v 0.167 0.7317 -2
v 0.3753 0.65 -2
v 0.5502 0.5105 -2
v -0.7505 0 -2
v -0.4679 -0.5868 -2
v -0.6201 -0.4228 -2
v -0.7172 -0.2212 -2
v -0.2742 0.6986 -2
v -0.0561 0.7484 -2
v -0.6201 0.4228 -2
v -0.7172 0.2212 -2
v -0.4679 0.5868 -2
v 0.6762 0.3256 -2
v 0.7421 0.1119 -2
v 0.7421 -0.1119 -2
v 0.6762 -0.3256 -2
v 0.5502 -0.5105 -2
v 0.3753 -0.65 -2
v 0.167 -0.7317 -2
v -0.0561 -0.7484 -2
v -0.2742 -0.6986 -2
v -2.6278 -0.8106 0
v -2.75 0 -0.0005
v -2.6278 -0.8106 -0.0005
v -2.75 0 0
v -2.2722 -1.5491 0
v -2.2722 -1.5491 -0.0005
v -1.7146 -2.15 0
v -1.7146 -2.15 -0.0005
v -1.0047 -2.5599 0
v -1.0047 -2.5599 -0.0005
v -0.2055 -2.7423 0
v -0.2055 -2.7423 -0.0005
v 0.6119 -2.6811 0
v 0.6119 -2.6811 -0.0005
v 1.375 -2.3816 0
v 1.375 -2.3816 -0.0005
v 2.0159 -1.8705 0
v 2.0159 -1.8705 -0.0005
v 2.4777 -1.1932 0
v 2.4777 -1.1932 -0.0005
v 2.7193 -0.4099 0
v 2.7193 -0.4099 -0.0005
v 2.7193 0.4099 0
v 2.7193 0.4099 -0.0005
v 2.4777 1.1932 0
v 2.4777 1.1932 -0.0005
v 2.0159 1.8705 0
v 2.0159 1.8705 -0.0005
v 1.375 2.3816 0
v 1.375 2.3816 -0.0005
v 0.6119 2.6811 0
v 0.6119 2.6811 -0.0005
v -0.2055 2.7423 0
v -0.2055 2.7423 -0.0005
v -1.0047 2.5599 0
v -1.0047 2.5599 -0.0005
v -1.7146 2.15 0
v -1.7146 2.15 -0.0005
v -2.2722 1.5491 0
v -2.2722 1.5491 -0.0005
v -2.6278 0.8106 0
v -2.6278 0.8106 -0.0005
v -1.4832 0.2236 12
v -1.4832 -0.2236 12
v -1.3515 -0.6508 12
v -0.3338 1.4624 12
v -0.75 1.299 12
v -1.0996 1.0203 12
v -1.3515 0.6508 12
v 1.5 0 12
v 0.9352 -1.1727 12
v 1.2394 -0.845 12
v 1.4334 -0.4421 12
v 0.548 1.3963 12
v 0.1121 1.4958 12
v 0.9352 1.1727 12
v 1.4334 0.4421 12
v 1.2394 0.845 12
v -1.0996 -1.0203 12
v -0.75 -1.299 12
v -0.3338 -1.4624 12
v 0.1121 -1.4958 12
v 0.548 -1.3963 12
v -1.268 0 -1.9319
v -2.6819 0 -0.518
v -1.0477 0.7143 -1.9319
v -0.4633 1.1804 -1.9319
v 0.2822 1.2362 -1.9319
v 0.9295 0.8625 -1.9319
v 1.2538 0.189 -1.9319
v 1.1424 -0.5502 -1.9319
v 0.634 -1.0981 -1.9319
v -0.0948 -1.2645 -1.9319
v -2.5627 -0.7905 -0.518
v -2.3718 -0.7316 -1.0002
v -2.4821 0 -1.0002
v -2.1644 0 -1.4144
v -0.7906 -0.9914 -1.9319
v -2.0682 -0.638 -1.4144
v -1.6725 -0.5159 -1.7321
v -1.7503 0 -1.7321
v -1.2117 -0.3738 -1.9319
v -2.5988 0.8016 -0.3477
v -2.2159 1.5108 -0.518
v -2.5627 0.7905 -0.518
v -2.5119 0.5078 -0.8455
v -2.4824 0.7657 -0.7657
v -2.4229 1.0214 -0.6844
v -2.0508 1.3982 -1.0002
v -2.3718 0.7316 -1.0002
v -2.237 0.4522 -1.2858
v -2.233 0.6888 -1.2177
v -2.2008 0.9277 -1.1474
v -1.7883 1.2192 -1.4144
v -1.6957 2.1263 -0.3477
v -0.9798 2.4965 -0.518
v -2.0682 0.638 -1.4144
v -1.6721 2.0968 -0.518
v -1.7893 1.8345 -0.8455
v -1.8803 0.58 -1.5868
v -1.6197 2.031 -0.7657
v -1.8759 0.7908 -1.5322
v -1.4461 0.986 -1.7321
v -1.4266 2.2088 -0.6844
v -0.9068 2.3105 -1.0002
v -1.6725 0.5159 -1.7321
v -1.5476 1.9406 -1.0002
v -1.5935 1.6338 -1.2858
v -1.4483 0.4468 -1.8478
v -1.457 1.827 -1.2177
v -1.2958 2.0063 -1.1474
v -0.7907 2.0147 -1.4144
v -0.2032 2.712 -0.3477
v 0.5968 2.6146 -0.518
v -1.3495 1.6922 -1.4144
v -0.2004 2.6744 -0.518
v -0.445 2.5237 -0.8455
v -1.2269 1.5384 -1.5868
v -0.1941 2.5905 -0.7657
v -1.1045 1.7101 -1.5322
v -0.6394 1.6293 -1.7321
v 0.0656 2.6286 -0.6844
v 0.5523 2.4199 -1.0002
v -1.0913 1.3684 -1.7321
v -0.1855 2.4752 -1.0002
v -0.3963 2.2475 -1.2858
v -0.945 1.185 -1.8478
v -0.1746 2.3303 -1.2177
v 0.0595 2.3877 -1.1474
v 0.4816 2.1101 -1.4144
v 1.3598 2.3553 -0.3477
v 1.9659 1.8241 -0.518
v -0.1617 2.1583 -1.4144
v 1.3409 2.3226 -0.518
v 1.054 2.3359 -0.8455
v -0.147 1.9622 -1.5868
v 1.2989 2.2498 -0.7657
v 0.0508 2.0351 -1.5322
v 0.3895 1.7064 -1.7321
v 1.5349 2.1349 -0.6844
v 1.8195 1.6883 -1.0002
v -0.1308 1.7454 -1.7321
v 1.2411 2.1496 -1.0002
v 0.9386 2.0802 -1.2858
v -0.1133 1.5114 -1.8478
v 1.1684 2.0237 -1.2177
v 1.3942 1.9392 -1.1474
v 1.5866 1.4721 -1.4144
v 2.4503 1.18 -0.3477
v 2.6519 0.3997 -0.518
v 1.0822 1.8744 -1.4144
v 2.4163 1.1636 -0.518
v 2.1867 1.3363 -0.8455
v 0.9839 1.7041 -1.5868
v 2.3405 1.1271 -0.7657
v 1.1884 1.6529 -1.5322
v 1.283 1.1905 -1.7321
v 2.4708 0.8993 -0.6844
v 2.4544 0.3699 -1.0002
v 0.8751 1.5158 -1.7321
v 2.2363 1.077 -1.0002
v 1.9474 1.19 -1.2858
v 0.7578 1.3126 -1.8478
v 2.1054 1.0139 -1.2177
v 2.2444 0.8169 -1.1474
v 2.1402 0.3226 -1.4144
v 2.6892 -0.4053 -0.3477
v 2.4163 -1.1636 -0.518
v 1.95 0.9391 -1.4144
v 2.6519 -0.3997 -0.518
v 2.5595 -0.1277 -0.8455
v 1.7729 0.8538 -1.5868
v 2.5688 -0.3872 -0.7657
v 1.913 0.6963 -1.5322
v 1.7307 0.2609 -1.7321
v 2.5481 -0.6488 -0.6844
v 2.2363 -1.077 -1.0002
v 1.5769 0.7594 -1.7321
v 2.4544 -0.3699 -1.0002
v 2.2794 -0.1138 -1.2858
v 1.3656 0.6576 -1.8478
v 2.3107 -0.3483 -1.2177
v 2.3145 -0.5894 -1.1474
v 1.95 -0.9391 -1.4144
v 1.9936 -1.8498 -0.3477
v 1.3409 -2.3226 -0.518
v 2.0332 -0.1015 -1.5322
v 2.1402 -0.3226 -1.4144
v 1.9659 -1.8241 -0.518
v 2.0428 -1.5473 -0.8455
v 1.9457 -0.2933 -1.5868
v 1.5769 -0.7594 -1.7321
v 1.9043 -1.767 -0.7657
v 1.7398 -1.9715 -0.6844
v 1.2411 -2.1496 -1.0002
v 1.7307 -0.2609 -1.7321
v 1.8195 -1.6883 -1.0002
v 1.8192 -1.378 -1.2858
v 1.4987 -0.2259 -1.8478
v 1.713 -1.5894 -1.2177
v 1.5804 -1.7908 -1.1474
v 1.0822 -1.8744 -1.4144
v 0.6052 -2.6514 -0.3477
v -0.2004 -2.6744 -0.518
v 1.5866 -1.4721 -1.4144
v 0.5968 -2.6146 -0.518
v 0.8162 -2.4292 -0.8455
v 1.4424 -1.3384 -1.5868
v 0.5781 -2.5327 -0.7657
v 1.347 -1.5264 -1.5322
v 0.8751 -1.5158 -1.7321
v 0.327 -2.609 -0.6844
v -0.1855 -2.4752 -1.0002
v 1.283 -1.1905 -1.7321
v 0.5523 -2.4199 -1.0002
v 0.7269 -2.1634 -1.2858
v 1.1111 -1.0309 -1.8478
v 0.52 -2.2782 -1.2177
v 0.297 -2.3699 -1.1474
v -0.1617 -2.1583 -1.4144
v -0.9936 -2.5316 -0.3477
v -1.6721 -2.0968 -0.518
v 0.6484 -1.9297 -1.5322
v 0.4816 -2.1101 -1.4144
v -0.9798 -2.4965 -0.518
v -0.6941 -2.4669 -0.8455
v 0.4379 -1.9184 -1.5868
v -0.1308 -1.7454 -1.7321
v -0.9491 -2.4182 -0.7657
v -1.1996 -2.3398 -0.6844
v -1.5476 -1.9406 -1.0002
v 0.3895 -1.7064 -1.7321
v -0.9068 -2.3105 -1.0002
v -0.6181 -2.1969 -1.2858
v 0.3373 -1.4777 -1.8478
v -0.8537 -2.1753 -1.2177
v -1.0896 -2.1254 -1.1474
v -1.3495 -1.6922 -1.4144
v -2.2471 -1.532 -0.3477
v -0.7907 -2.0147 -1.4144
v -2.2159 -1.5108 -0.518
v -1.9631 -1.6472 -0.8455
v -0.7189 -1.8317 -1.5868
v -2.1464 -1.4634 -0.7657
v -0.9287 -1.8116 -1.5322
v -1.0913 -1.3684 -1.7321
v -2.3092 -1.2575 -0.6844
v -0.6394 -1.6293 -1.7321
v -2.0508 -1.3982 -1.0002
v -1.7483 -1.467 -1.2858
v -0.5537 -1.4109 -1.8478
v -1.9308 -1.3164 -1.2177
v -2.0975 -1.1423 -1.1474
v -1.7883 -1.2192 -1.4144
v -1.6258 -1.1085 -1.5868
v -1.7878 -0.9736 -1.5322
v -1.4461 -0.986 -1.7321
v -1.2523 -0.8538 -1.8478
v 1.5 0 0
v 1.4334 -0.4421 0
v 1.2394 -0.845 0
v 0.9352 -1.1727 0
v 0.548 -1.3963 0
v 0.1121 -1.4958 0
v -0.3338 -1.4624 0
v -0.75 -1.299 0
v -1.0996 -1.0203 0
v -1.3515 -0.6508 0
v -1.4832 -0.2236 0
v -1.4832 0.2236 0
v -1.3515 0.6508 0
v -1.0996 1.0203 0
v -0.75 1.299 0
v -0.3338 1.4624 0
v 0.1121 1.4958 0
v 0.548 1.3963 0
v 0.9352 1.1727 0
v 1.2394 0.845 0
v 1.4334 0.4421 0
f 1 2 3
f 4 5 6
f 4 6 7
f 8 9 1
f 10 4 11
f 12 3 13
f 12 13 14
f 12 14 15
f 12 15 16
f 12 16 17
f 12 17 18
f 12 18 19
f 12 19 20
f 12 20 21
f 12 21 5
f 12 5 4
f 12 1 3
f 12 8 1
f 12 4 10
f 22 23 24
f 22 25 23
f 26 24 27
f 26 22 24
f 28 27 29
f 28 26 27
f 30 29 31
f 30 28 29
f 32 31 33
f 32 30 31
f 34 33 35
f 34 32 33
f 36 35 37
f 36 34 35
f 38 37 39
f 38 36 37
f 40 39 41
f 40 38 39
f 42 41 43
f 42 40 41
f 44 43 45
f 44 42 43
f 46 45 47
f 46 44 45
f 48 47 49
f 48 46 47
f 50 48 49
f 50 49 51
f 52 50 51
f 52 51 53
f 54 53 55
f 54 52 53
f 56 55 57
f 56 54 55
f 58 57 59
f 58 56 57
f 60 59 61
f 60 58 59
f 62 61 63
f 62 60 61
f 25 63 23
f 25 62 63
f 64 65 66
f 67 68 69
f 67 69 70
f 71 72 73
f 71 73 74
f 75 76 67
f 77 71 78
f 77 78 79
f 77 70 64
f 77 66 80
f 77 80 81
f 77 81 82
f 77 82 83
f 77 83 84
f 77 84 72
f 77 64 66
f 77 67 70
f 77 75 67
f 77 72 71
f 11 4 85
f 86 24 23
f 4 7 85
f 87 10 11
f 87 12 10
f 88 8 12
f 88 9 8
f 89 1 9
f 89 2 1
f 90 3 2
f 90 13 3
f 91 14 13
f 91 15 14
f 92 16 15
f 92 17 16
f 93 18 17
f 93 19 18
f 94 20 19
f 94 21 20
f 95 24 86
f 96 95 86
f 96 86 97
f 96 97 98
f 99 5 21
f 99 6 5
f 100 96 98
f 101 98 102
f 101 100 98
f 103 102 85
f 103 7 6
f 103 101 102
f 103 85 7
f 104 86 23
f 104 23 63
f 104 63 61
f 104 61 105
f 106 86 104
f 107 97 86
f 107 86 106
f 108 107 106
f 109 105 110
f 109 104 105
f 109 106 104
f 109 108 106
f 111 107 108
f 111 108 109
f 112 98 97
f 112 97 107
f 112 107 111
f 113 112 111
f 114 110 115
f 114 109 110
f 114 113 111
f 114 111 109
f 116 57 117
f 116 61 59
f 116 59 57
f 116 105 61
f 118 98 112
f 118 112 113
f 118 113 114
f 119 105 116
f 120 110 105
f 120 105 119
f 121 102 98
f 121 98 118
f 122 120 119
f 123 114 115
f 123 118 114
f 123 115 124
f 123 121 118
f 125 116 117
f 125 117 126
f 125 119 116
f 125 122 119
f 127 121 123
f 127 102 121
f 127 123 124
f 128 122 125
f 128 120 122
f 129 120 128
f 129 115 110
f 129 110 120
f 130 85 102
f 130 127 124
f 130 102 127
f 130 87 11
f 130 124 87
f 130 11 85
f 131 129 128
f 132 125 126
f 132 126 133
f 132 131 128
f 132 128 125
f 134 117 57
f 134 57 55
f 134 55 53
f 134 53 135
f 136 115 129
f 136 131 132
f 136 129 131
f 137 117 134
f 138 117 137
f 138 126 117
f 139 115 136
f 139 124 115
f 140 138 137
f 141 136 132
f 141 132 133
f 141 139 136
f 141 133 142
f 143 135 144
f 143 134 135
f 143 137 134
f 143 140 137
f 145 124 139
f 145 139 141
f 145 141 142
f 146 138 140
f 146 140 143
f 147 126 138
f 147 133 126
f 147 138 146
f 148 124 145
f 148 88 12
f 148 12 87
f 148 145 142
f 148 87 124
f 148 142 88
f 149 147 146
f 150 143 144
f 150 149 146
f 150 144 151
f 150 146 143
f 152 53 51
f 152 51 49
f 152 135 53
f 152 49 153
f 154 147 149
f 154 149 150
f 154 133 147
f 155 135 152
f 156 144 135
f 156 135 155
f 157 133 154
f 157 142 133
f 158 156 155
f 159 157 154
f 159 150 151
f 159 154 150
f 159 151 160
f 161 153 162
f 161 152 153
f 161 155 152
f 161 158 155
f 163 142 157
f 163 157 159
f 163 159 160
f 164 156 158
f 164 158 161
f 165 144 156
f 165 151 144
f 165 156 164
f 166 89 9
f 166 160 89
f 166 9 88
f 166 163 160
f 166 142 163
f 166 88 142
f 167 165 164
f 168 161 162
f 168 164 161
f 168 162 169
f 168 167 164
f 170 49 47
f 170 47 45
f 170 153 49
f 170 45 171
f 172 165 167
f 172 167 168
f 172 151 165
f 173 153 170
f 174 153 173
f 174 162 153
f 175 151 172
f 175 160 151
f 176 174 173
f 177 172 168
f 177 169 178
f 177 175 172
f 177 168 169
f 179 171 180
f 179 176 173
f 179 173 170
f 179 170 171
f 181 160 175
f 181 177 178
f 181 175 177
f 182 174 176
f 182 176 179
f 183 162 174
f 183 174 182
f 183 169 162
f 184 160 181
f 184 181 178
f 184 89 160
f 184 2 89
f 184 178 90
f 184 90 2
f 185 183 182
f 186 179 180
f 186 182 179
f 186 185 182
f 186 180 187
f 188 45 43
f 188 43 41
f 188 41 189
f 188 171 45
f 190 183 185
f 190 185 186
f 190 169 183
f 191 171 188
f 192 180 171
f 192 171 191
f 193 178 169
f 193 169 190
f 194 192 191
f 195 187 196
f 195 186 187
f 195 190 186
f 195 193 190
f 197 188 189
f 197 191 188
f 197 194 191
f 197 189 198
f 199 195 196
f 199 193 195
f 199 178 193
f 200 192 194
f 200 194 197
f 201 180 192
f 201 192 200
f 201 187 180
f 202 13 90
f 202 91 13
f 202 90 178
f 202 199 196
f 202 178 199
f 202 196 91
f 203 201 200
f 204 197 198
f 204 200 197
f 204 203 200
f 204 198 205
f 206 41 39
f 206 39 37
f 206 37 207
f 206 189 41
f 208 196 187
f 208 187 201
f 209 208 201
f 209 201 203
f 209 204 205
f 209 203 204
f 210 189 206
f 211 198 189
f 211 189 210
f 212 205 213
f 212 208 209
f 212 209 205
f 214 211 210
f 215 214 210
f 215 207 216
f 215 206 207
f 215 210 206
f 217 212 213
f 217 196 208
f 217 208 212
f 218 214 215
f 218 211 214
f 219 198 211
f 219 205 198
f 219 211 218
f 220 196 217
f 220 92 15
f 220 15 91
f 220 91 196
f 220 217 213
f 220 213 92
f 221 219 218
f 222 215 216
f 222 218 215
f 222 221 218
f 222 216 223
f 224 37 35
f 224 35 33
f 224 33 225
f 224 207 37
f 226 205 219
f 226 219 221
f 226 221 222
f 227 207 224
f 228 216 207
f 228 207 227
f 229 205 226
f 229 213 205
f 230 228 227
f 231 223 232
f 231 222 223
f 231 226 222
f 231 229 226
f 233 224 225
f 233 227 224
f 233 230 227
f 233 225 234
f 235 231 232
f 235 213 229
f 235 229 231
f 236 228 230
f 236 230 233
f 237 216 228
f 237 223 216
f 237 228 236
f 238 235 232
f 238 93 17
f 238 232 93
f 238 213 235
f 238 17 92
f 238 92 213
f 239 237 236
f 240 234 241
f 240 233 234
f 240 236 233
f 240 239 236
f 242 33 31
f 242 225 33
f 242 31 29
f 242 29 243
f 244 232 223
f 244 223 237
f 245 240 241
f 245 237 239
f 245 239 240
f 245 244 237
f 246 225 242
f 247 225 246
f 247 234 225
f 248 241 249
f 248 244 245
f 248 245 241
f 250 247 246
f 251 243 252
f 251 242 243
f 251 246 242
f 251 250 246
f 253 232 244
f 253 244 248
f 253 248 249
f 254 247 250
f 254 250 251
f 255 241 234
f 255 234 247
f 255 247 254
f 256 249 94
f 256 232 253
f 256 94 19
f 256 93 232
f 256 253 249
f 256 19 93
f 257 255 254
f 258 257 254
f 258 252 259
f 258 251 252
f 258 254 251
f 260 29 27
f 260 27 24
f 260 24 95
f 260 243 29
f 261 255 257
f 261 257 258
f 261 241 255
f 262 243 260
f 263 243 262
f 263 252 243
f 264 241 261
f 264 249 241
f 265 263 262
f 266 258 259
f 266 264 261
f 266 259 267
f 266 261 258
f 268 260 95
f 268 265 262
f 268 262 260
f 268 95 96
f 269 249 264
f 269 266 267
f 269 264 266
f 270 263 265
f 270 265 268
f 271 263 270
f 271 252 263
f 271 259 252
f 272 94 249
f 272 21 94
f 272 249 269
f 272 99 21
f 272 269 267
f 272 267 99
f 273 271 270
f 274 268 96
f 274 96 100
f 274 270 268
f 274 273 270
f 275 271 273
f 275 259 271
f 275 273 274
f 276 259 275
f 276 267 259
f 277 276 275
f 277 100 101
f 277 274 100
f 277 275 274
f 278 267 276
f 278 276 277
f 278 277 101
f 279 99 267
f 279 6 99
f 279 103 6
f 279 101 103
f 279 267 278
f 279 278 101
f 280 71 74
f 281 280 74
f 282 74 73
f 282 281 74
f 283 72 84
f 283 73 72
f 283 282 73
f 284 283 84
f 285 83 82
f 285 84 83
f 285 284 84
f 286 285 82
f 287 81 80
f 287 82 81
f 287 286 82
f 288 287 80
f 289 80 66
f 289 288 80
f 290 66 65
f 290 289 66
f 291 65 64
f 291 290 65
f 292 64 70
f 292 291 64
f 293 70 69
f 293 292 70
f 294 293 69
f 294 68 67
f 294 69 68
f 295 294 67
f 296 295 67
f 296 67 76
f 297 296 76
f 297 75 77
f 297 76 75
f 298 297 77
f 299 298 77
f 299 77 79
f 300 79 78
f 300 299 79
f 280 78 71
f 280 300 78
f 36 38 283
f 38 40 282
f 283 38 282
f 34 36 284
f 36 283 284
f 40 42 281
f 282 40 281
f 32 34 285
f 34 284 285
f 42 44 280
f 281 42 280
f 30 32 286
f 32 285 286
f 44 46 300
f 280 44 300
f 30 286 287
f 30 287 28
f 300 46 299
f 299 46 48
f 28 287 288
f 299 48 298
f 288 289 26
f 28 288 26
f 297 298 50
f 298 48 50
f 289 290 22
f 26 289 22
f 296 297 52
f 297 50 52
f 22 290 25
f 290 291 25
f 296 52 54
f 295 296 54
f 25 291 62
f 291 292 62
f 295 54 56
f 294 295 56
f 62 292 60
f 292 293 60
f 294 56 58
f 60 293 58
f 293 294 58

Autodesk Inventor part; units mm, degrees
ref_plane "YZ Plane" through (0, 0, 0) normal (1, 0, 0) x (0, 1, 0)
ref_plane "XZ Plane" through (0, 0, 0) normal (0, 1, 0) x (-1, 0, 0)
ref_plane "XY Plane" through (0, 0, 0) normal (0, 0, 1) x (1, 0, 0)
sketch "スケッチ1" plane through (0, 0, 0) normal (0, 0, 1) x (1, 0, 0)
  circle A0 centre (0, 0) radius 1.5
  dimension "d0" = 3
extrude "押し出し1" add sketch "スケッチ1" along normal blind 12
sketch "スケッチ2" plane through (0, 0, 0) normal (0, 0, -1) x (-1, 0, 0)
  circle A0 centre (0, 0) radius 2.75
  dimension "d3" = 5.5
extrude "押し出し2" add sketch "スケッチ2" along normal blind 2
fillet "フィレット1" radius 2 1 edges at (2.75, 0, -2)
thread "ねじ1" size "M3x0.5" class "6g" standard "ANSI Metric M Profile" full length
properties part number "ネジ鍋m3,12" material "鋼、高強度、低合金"
